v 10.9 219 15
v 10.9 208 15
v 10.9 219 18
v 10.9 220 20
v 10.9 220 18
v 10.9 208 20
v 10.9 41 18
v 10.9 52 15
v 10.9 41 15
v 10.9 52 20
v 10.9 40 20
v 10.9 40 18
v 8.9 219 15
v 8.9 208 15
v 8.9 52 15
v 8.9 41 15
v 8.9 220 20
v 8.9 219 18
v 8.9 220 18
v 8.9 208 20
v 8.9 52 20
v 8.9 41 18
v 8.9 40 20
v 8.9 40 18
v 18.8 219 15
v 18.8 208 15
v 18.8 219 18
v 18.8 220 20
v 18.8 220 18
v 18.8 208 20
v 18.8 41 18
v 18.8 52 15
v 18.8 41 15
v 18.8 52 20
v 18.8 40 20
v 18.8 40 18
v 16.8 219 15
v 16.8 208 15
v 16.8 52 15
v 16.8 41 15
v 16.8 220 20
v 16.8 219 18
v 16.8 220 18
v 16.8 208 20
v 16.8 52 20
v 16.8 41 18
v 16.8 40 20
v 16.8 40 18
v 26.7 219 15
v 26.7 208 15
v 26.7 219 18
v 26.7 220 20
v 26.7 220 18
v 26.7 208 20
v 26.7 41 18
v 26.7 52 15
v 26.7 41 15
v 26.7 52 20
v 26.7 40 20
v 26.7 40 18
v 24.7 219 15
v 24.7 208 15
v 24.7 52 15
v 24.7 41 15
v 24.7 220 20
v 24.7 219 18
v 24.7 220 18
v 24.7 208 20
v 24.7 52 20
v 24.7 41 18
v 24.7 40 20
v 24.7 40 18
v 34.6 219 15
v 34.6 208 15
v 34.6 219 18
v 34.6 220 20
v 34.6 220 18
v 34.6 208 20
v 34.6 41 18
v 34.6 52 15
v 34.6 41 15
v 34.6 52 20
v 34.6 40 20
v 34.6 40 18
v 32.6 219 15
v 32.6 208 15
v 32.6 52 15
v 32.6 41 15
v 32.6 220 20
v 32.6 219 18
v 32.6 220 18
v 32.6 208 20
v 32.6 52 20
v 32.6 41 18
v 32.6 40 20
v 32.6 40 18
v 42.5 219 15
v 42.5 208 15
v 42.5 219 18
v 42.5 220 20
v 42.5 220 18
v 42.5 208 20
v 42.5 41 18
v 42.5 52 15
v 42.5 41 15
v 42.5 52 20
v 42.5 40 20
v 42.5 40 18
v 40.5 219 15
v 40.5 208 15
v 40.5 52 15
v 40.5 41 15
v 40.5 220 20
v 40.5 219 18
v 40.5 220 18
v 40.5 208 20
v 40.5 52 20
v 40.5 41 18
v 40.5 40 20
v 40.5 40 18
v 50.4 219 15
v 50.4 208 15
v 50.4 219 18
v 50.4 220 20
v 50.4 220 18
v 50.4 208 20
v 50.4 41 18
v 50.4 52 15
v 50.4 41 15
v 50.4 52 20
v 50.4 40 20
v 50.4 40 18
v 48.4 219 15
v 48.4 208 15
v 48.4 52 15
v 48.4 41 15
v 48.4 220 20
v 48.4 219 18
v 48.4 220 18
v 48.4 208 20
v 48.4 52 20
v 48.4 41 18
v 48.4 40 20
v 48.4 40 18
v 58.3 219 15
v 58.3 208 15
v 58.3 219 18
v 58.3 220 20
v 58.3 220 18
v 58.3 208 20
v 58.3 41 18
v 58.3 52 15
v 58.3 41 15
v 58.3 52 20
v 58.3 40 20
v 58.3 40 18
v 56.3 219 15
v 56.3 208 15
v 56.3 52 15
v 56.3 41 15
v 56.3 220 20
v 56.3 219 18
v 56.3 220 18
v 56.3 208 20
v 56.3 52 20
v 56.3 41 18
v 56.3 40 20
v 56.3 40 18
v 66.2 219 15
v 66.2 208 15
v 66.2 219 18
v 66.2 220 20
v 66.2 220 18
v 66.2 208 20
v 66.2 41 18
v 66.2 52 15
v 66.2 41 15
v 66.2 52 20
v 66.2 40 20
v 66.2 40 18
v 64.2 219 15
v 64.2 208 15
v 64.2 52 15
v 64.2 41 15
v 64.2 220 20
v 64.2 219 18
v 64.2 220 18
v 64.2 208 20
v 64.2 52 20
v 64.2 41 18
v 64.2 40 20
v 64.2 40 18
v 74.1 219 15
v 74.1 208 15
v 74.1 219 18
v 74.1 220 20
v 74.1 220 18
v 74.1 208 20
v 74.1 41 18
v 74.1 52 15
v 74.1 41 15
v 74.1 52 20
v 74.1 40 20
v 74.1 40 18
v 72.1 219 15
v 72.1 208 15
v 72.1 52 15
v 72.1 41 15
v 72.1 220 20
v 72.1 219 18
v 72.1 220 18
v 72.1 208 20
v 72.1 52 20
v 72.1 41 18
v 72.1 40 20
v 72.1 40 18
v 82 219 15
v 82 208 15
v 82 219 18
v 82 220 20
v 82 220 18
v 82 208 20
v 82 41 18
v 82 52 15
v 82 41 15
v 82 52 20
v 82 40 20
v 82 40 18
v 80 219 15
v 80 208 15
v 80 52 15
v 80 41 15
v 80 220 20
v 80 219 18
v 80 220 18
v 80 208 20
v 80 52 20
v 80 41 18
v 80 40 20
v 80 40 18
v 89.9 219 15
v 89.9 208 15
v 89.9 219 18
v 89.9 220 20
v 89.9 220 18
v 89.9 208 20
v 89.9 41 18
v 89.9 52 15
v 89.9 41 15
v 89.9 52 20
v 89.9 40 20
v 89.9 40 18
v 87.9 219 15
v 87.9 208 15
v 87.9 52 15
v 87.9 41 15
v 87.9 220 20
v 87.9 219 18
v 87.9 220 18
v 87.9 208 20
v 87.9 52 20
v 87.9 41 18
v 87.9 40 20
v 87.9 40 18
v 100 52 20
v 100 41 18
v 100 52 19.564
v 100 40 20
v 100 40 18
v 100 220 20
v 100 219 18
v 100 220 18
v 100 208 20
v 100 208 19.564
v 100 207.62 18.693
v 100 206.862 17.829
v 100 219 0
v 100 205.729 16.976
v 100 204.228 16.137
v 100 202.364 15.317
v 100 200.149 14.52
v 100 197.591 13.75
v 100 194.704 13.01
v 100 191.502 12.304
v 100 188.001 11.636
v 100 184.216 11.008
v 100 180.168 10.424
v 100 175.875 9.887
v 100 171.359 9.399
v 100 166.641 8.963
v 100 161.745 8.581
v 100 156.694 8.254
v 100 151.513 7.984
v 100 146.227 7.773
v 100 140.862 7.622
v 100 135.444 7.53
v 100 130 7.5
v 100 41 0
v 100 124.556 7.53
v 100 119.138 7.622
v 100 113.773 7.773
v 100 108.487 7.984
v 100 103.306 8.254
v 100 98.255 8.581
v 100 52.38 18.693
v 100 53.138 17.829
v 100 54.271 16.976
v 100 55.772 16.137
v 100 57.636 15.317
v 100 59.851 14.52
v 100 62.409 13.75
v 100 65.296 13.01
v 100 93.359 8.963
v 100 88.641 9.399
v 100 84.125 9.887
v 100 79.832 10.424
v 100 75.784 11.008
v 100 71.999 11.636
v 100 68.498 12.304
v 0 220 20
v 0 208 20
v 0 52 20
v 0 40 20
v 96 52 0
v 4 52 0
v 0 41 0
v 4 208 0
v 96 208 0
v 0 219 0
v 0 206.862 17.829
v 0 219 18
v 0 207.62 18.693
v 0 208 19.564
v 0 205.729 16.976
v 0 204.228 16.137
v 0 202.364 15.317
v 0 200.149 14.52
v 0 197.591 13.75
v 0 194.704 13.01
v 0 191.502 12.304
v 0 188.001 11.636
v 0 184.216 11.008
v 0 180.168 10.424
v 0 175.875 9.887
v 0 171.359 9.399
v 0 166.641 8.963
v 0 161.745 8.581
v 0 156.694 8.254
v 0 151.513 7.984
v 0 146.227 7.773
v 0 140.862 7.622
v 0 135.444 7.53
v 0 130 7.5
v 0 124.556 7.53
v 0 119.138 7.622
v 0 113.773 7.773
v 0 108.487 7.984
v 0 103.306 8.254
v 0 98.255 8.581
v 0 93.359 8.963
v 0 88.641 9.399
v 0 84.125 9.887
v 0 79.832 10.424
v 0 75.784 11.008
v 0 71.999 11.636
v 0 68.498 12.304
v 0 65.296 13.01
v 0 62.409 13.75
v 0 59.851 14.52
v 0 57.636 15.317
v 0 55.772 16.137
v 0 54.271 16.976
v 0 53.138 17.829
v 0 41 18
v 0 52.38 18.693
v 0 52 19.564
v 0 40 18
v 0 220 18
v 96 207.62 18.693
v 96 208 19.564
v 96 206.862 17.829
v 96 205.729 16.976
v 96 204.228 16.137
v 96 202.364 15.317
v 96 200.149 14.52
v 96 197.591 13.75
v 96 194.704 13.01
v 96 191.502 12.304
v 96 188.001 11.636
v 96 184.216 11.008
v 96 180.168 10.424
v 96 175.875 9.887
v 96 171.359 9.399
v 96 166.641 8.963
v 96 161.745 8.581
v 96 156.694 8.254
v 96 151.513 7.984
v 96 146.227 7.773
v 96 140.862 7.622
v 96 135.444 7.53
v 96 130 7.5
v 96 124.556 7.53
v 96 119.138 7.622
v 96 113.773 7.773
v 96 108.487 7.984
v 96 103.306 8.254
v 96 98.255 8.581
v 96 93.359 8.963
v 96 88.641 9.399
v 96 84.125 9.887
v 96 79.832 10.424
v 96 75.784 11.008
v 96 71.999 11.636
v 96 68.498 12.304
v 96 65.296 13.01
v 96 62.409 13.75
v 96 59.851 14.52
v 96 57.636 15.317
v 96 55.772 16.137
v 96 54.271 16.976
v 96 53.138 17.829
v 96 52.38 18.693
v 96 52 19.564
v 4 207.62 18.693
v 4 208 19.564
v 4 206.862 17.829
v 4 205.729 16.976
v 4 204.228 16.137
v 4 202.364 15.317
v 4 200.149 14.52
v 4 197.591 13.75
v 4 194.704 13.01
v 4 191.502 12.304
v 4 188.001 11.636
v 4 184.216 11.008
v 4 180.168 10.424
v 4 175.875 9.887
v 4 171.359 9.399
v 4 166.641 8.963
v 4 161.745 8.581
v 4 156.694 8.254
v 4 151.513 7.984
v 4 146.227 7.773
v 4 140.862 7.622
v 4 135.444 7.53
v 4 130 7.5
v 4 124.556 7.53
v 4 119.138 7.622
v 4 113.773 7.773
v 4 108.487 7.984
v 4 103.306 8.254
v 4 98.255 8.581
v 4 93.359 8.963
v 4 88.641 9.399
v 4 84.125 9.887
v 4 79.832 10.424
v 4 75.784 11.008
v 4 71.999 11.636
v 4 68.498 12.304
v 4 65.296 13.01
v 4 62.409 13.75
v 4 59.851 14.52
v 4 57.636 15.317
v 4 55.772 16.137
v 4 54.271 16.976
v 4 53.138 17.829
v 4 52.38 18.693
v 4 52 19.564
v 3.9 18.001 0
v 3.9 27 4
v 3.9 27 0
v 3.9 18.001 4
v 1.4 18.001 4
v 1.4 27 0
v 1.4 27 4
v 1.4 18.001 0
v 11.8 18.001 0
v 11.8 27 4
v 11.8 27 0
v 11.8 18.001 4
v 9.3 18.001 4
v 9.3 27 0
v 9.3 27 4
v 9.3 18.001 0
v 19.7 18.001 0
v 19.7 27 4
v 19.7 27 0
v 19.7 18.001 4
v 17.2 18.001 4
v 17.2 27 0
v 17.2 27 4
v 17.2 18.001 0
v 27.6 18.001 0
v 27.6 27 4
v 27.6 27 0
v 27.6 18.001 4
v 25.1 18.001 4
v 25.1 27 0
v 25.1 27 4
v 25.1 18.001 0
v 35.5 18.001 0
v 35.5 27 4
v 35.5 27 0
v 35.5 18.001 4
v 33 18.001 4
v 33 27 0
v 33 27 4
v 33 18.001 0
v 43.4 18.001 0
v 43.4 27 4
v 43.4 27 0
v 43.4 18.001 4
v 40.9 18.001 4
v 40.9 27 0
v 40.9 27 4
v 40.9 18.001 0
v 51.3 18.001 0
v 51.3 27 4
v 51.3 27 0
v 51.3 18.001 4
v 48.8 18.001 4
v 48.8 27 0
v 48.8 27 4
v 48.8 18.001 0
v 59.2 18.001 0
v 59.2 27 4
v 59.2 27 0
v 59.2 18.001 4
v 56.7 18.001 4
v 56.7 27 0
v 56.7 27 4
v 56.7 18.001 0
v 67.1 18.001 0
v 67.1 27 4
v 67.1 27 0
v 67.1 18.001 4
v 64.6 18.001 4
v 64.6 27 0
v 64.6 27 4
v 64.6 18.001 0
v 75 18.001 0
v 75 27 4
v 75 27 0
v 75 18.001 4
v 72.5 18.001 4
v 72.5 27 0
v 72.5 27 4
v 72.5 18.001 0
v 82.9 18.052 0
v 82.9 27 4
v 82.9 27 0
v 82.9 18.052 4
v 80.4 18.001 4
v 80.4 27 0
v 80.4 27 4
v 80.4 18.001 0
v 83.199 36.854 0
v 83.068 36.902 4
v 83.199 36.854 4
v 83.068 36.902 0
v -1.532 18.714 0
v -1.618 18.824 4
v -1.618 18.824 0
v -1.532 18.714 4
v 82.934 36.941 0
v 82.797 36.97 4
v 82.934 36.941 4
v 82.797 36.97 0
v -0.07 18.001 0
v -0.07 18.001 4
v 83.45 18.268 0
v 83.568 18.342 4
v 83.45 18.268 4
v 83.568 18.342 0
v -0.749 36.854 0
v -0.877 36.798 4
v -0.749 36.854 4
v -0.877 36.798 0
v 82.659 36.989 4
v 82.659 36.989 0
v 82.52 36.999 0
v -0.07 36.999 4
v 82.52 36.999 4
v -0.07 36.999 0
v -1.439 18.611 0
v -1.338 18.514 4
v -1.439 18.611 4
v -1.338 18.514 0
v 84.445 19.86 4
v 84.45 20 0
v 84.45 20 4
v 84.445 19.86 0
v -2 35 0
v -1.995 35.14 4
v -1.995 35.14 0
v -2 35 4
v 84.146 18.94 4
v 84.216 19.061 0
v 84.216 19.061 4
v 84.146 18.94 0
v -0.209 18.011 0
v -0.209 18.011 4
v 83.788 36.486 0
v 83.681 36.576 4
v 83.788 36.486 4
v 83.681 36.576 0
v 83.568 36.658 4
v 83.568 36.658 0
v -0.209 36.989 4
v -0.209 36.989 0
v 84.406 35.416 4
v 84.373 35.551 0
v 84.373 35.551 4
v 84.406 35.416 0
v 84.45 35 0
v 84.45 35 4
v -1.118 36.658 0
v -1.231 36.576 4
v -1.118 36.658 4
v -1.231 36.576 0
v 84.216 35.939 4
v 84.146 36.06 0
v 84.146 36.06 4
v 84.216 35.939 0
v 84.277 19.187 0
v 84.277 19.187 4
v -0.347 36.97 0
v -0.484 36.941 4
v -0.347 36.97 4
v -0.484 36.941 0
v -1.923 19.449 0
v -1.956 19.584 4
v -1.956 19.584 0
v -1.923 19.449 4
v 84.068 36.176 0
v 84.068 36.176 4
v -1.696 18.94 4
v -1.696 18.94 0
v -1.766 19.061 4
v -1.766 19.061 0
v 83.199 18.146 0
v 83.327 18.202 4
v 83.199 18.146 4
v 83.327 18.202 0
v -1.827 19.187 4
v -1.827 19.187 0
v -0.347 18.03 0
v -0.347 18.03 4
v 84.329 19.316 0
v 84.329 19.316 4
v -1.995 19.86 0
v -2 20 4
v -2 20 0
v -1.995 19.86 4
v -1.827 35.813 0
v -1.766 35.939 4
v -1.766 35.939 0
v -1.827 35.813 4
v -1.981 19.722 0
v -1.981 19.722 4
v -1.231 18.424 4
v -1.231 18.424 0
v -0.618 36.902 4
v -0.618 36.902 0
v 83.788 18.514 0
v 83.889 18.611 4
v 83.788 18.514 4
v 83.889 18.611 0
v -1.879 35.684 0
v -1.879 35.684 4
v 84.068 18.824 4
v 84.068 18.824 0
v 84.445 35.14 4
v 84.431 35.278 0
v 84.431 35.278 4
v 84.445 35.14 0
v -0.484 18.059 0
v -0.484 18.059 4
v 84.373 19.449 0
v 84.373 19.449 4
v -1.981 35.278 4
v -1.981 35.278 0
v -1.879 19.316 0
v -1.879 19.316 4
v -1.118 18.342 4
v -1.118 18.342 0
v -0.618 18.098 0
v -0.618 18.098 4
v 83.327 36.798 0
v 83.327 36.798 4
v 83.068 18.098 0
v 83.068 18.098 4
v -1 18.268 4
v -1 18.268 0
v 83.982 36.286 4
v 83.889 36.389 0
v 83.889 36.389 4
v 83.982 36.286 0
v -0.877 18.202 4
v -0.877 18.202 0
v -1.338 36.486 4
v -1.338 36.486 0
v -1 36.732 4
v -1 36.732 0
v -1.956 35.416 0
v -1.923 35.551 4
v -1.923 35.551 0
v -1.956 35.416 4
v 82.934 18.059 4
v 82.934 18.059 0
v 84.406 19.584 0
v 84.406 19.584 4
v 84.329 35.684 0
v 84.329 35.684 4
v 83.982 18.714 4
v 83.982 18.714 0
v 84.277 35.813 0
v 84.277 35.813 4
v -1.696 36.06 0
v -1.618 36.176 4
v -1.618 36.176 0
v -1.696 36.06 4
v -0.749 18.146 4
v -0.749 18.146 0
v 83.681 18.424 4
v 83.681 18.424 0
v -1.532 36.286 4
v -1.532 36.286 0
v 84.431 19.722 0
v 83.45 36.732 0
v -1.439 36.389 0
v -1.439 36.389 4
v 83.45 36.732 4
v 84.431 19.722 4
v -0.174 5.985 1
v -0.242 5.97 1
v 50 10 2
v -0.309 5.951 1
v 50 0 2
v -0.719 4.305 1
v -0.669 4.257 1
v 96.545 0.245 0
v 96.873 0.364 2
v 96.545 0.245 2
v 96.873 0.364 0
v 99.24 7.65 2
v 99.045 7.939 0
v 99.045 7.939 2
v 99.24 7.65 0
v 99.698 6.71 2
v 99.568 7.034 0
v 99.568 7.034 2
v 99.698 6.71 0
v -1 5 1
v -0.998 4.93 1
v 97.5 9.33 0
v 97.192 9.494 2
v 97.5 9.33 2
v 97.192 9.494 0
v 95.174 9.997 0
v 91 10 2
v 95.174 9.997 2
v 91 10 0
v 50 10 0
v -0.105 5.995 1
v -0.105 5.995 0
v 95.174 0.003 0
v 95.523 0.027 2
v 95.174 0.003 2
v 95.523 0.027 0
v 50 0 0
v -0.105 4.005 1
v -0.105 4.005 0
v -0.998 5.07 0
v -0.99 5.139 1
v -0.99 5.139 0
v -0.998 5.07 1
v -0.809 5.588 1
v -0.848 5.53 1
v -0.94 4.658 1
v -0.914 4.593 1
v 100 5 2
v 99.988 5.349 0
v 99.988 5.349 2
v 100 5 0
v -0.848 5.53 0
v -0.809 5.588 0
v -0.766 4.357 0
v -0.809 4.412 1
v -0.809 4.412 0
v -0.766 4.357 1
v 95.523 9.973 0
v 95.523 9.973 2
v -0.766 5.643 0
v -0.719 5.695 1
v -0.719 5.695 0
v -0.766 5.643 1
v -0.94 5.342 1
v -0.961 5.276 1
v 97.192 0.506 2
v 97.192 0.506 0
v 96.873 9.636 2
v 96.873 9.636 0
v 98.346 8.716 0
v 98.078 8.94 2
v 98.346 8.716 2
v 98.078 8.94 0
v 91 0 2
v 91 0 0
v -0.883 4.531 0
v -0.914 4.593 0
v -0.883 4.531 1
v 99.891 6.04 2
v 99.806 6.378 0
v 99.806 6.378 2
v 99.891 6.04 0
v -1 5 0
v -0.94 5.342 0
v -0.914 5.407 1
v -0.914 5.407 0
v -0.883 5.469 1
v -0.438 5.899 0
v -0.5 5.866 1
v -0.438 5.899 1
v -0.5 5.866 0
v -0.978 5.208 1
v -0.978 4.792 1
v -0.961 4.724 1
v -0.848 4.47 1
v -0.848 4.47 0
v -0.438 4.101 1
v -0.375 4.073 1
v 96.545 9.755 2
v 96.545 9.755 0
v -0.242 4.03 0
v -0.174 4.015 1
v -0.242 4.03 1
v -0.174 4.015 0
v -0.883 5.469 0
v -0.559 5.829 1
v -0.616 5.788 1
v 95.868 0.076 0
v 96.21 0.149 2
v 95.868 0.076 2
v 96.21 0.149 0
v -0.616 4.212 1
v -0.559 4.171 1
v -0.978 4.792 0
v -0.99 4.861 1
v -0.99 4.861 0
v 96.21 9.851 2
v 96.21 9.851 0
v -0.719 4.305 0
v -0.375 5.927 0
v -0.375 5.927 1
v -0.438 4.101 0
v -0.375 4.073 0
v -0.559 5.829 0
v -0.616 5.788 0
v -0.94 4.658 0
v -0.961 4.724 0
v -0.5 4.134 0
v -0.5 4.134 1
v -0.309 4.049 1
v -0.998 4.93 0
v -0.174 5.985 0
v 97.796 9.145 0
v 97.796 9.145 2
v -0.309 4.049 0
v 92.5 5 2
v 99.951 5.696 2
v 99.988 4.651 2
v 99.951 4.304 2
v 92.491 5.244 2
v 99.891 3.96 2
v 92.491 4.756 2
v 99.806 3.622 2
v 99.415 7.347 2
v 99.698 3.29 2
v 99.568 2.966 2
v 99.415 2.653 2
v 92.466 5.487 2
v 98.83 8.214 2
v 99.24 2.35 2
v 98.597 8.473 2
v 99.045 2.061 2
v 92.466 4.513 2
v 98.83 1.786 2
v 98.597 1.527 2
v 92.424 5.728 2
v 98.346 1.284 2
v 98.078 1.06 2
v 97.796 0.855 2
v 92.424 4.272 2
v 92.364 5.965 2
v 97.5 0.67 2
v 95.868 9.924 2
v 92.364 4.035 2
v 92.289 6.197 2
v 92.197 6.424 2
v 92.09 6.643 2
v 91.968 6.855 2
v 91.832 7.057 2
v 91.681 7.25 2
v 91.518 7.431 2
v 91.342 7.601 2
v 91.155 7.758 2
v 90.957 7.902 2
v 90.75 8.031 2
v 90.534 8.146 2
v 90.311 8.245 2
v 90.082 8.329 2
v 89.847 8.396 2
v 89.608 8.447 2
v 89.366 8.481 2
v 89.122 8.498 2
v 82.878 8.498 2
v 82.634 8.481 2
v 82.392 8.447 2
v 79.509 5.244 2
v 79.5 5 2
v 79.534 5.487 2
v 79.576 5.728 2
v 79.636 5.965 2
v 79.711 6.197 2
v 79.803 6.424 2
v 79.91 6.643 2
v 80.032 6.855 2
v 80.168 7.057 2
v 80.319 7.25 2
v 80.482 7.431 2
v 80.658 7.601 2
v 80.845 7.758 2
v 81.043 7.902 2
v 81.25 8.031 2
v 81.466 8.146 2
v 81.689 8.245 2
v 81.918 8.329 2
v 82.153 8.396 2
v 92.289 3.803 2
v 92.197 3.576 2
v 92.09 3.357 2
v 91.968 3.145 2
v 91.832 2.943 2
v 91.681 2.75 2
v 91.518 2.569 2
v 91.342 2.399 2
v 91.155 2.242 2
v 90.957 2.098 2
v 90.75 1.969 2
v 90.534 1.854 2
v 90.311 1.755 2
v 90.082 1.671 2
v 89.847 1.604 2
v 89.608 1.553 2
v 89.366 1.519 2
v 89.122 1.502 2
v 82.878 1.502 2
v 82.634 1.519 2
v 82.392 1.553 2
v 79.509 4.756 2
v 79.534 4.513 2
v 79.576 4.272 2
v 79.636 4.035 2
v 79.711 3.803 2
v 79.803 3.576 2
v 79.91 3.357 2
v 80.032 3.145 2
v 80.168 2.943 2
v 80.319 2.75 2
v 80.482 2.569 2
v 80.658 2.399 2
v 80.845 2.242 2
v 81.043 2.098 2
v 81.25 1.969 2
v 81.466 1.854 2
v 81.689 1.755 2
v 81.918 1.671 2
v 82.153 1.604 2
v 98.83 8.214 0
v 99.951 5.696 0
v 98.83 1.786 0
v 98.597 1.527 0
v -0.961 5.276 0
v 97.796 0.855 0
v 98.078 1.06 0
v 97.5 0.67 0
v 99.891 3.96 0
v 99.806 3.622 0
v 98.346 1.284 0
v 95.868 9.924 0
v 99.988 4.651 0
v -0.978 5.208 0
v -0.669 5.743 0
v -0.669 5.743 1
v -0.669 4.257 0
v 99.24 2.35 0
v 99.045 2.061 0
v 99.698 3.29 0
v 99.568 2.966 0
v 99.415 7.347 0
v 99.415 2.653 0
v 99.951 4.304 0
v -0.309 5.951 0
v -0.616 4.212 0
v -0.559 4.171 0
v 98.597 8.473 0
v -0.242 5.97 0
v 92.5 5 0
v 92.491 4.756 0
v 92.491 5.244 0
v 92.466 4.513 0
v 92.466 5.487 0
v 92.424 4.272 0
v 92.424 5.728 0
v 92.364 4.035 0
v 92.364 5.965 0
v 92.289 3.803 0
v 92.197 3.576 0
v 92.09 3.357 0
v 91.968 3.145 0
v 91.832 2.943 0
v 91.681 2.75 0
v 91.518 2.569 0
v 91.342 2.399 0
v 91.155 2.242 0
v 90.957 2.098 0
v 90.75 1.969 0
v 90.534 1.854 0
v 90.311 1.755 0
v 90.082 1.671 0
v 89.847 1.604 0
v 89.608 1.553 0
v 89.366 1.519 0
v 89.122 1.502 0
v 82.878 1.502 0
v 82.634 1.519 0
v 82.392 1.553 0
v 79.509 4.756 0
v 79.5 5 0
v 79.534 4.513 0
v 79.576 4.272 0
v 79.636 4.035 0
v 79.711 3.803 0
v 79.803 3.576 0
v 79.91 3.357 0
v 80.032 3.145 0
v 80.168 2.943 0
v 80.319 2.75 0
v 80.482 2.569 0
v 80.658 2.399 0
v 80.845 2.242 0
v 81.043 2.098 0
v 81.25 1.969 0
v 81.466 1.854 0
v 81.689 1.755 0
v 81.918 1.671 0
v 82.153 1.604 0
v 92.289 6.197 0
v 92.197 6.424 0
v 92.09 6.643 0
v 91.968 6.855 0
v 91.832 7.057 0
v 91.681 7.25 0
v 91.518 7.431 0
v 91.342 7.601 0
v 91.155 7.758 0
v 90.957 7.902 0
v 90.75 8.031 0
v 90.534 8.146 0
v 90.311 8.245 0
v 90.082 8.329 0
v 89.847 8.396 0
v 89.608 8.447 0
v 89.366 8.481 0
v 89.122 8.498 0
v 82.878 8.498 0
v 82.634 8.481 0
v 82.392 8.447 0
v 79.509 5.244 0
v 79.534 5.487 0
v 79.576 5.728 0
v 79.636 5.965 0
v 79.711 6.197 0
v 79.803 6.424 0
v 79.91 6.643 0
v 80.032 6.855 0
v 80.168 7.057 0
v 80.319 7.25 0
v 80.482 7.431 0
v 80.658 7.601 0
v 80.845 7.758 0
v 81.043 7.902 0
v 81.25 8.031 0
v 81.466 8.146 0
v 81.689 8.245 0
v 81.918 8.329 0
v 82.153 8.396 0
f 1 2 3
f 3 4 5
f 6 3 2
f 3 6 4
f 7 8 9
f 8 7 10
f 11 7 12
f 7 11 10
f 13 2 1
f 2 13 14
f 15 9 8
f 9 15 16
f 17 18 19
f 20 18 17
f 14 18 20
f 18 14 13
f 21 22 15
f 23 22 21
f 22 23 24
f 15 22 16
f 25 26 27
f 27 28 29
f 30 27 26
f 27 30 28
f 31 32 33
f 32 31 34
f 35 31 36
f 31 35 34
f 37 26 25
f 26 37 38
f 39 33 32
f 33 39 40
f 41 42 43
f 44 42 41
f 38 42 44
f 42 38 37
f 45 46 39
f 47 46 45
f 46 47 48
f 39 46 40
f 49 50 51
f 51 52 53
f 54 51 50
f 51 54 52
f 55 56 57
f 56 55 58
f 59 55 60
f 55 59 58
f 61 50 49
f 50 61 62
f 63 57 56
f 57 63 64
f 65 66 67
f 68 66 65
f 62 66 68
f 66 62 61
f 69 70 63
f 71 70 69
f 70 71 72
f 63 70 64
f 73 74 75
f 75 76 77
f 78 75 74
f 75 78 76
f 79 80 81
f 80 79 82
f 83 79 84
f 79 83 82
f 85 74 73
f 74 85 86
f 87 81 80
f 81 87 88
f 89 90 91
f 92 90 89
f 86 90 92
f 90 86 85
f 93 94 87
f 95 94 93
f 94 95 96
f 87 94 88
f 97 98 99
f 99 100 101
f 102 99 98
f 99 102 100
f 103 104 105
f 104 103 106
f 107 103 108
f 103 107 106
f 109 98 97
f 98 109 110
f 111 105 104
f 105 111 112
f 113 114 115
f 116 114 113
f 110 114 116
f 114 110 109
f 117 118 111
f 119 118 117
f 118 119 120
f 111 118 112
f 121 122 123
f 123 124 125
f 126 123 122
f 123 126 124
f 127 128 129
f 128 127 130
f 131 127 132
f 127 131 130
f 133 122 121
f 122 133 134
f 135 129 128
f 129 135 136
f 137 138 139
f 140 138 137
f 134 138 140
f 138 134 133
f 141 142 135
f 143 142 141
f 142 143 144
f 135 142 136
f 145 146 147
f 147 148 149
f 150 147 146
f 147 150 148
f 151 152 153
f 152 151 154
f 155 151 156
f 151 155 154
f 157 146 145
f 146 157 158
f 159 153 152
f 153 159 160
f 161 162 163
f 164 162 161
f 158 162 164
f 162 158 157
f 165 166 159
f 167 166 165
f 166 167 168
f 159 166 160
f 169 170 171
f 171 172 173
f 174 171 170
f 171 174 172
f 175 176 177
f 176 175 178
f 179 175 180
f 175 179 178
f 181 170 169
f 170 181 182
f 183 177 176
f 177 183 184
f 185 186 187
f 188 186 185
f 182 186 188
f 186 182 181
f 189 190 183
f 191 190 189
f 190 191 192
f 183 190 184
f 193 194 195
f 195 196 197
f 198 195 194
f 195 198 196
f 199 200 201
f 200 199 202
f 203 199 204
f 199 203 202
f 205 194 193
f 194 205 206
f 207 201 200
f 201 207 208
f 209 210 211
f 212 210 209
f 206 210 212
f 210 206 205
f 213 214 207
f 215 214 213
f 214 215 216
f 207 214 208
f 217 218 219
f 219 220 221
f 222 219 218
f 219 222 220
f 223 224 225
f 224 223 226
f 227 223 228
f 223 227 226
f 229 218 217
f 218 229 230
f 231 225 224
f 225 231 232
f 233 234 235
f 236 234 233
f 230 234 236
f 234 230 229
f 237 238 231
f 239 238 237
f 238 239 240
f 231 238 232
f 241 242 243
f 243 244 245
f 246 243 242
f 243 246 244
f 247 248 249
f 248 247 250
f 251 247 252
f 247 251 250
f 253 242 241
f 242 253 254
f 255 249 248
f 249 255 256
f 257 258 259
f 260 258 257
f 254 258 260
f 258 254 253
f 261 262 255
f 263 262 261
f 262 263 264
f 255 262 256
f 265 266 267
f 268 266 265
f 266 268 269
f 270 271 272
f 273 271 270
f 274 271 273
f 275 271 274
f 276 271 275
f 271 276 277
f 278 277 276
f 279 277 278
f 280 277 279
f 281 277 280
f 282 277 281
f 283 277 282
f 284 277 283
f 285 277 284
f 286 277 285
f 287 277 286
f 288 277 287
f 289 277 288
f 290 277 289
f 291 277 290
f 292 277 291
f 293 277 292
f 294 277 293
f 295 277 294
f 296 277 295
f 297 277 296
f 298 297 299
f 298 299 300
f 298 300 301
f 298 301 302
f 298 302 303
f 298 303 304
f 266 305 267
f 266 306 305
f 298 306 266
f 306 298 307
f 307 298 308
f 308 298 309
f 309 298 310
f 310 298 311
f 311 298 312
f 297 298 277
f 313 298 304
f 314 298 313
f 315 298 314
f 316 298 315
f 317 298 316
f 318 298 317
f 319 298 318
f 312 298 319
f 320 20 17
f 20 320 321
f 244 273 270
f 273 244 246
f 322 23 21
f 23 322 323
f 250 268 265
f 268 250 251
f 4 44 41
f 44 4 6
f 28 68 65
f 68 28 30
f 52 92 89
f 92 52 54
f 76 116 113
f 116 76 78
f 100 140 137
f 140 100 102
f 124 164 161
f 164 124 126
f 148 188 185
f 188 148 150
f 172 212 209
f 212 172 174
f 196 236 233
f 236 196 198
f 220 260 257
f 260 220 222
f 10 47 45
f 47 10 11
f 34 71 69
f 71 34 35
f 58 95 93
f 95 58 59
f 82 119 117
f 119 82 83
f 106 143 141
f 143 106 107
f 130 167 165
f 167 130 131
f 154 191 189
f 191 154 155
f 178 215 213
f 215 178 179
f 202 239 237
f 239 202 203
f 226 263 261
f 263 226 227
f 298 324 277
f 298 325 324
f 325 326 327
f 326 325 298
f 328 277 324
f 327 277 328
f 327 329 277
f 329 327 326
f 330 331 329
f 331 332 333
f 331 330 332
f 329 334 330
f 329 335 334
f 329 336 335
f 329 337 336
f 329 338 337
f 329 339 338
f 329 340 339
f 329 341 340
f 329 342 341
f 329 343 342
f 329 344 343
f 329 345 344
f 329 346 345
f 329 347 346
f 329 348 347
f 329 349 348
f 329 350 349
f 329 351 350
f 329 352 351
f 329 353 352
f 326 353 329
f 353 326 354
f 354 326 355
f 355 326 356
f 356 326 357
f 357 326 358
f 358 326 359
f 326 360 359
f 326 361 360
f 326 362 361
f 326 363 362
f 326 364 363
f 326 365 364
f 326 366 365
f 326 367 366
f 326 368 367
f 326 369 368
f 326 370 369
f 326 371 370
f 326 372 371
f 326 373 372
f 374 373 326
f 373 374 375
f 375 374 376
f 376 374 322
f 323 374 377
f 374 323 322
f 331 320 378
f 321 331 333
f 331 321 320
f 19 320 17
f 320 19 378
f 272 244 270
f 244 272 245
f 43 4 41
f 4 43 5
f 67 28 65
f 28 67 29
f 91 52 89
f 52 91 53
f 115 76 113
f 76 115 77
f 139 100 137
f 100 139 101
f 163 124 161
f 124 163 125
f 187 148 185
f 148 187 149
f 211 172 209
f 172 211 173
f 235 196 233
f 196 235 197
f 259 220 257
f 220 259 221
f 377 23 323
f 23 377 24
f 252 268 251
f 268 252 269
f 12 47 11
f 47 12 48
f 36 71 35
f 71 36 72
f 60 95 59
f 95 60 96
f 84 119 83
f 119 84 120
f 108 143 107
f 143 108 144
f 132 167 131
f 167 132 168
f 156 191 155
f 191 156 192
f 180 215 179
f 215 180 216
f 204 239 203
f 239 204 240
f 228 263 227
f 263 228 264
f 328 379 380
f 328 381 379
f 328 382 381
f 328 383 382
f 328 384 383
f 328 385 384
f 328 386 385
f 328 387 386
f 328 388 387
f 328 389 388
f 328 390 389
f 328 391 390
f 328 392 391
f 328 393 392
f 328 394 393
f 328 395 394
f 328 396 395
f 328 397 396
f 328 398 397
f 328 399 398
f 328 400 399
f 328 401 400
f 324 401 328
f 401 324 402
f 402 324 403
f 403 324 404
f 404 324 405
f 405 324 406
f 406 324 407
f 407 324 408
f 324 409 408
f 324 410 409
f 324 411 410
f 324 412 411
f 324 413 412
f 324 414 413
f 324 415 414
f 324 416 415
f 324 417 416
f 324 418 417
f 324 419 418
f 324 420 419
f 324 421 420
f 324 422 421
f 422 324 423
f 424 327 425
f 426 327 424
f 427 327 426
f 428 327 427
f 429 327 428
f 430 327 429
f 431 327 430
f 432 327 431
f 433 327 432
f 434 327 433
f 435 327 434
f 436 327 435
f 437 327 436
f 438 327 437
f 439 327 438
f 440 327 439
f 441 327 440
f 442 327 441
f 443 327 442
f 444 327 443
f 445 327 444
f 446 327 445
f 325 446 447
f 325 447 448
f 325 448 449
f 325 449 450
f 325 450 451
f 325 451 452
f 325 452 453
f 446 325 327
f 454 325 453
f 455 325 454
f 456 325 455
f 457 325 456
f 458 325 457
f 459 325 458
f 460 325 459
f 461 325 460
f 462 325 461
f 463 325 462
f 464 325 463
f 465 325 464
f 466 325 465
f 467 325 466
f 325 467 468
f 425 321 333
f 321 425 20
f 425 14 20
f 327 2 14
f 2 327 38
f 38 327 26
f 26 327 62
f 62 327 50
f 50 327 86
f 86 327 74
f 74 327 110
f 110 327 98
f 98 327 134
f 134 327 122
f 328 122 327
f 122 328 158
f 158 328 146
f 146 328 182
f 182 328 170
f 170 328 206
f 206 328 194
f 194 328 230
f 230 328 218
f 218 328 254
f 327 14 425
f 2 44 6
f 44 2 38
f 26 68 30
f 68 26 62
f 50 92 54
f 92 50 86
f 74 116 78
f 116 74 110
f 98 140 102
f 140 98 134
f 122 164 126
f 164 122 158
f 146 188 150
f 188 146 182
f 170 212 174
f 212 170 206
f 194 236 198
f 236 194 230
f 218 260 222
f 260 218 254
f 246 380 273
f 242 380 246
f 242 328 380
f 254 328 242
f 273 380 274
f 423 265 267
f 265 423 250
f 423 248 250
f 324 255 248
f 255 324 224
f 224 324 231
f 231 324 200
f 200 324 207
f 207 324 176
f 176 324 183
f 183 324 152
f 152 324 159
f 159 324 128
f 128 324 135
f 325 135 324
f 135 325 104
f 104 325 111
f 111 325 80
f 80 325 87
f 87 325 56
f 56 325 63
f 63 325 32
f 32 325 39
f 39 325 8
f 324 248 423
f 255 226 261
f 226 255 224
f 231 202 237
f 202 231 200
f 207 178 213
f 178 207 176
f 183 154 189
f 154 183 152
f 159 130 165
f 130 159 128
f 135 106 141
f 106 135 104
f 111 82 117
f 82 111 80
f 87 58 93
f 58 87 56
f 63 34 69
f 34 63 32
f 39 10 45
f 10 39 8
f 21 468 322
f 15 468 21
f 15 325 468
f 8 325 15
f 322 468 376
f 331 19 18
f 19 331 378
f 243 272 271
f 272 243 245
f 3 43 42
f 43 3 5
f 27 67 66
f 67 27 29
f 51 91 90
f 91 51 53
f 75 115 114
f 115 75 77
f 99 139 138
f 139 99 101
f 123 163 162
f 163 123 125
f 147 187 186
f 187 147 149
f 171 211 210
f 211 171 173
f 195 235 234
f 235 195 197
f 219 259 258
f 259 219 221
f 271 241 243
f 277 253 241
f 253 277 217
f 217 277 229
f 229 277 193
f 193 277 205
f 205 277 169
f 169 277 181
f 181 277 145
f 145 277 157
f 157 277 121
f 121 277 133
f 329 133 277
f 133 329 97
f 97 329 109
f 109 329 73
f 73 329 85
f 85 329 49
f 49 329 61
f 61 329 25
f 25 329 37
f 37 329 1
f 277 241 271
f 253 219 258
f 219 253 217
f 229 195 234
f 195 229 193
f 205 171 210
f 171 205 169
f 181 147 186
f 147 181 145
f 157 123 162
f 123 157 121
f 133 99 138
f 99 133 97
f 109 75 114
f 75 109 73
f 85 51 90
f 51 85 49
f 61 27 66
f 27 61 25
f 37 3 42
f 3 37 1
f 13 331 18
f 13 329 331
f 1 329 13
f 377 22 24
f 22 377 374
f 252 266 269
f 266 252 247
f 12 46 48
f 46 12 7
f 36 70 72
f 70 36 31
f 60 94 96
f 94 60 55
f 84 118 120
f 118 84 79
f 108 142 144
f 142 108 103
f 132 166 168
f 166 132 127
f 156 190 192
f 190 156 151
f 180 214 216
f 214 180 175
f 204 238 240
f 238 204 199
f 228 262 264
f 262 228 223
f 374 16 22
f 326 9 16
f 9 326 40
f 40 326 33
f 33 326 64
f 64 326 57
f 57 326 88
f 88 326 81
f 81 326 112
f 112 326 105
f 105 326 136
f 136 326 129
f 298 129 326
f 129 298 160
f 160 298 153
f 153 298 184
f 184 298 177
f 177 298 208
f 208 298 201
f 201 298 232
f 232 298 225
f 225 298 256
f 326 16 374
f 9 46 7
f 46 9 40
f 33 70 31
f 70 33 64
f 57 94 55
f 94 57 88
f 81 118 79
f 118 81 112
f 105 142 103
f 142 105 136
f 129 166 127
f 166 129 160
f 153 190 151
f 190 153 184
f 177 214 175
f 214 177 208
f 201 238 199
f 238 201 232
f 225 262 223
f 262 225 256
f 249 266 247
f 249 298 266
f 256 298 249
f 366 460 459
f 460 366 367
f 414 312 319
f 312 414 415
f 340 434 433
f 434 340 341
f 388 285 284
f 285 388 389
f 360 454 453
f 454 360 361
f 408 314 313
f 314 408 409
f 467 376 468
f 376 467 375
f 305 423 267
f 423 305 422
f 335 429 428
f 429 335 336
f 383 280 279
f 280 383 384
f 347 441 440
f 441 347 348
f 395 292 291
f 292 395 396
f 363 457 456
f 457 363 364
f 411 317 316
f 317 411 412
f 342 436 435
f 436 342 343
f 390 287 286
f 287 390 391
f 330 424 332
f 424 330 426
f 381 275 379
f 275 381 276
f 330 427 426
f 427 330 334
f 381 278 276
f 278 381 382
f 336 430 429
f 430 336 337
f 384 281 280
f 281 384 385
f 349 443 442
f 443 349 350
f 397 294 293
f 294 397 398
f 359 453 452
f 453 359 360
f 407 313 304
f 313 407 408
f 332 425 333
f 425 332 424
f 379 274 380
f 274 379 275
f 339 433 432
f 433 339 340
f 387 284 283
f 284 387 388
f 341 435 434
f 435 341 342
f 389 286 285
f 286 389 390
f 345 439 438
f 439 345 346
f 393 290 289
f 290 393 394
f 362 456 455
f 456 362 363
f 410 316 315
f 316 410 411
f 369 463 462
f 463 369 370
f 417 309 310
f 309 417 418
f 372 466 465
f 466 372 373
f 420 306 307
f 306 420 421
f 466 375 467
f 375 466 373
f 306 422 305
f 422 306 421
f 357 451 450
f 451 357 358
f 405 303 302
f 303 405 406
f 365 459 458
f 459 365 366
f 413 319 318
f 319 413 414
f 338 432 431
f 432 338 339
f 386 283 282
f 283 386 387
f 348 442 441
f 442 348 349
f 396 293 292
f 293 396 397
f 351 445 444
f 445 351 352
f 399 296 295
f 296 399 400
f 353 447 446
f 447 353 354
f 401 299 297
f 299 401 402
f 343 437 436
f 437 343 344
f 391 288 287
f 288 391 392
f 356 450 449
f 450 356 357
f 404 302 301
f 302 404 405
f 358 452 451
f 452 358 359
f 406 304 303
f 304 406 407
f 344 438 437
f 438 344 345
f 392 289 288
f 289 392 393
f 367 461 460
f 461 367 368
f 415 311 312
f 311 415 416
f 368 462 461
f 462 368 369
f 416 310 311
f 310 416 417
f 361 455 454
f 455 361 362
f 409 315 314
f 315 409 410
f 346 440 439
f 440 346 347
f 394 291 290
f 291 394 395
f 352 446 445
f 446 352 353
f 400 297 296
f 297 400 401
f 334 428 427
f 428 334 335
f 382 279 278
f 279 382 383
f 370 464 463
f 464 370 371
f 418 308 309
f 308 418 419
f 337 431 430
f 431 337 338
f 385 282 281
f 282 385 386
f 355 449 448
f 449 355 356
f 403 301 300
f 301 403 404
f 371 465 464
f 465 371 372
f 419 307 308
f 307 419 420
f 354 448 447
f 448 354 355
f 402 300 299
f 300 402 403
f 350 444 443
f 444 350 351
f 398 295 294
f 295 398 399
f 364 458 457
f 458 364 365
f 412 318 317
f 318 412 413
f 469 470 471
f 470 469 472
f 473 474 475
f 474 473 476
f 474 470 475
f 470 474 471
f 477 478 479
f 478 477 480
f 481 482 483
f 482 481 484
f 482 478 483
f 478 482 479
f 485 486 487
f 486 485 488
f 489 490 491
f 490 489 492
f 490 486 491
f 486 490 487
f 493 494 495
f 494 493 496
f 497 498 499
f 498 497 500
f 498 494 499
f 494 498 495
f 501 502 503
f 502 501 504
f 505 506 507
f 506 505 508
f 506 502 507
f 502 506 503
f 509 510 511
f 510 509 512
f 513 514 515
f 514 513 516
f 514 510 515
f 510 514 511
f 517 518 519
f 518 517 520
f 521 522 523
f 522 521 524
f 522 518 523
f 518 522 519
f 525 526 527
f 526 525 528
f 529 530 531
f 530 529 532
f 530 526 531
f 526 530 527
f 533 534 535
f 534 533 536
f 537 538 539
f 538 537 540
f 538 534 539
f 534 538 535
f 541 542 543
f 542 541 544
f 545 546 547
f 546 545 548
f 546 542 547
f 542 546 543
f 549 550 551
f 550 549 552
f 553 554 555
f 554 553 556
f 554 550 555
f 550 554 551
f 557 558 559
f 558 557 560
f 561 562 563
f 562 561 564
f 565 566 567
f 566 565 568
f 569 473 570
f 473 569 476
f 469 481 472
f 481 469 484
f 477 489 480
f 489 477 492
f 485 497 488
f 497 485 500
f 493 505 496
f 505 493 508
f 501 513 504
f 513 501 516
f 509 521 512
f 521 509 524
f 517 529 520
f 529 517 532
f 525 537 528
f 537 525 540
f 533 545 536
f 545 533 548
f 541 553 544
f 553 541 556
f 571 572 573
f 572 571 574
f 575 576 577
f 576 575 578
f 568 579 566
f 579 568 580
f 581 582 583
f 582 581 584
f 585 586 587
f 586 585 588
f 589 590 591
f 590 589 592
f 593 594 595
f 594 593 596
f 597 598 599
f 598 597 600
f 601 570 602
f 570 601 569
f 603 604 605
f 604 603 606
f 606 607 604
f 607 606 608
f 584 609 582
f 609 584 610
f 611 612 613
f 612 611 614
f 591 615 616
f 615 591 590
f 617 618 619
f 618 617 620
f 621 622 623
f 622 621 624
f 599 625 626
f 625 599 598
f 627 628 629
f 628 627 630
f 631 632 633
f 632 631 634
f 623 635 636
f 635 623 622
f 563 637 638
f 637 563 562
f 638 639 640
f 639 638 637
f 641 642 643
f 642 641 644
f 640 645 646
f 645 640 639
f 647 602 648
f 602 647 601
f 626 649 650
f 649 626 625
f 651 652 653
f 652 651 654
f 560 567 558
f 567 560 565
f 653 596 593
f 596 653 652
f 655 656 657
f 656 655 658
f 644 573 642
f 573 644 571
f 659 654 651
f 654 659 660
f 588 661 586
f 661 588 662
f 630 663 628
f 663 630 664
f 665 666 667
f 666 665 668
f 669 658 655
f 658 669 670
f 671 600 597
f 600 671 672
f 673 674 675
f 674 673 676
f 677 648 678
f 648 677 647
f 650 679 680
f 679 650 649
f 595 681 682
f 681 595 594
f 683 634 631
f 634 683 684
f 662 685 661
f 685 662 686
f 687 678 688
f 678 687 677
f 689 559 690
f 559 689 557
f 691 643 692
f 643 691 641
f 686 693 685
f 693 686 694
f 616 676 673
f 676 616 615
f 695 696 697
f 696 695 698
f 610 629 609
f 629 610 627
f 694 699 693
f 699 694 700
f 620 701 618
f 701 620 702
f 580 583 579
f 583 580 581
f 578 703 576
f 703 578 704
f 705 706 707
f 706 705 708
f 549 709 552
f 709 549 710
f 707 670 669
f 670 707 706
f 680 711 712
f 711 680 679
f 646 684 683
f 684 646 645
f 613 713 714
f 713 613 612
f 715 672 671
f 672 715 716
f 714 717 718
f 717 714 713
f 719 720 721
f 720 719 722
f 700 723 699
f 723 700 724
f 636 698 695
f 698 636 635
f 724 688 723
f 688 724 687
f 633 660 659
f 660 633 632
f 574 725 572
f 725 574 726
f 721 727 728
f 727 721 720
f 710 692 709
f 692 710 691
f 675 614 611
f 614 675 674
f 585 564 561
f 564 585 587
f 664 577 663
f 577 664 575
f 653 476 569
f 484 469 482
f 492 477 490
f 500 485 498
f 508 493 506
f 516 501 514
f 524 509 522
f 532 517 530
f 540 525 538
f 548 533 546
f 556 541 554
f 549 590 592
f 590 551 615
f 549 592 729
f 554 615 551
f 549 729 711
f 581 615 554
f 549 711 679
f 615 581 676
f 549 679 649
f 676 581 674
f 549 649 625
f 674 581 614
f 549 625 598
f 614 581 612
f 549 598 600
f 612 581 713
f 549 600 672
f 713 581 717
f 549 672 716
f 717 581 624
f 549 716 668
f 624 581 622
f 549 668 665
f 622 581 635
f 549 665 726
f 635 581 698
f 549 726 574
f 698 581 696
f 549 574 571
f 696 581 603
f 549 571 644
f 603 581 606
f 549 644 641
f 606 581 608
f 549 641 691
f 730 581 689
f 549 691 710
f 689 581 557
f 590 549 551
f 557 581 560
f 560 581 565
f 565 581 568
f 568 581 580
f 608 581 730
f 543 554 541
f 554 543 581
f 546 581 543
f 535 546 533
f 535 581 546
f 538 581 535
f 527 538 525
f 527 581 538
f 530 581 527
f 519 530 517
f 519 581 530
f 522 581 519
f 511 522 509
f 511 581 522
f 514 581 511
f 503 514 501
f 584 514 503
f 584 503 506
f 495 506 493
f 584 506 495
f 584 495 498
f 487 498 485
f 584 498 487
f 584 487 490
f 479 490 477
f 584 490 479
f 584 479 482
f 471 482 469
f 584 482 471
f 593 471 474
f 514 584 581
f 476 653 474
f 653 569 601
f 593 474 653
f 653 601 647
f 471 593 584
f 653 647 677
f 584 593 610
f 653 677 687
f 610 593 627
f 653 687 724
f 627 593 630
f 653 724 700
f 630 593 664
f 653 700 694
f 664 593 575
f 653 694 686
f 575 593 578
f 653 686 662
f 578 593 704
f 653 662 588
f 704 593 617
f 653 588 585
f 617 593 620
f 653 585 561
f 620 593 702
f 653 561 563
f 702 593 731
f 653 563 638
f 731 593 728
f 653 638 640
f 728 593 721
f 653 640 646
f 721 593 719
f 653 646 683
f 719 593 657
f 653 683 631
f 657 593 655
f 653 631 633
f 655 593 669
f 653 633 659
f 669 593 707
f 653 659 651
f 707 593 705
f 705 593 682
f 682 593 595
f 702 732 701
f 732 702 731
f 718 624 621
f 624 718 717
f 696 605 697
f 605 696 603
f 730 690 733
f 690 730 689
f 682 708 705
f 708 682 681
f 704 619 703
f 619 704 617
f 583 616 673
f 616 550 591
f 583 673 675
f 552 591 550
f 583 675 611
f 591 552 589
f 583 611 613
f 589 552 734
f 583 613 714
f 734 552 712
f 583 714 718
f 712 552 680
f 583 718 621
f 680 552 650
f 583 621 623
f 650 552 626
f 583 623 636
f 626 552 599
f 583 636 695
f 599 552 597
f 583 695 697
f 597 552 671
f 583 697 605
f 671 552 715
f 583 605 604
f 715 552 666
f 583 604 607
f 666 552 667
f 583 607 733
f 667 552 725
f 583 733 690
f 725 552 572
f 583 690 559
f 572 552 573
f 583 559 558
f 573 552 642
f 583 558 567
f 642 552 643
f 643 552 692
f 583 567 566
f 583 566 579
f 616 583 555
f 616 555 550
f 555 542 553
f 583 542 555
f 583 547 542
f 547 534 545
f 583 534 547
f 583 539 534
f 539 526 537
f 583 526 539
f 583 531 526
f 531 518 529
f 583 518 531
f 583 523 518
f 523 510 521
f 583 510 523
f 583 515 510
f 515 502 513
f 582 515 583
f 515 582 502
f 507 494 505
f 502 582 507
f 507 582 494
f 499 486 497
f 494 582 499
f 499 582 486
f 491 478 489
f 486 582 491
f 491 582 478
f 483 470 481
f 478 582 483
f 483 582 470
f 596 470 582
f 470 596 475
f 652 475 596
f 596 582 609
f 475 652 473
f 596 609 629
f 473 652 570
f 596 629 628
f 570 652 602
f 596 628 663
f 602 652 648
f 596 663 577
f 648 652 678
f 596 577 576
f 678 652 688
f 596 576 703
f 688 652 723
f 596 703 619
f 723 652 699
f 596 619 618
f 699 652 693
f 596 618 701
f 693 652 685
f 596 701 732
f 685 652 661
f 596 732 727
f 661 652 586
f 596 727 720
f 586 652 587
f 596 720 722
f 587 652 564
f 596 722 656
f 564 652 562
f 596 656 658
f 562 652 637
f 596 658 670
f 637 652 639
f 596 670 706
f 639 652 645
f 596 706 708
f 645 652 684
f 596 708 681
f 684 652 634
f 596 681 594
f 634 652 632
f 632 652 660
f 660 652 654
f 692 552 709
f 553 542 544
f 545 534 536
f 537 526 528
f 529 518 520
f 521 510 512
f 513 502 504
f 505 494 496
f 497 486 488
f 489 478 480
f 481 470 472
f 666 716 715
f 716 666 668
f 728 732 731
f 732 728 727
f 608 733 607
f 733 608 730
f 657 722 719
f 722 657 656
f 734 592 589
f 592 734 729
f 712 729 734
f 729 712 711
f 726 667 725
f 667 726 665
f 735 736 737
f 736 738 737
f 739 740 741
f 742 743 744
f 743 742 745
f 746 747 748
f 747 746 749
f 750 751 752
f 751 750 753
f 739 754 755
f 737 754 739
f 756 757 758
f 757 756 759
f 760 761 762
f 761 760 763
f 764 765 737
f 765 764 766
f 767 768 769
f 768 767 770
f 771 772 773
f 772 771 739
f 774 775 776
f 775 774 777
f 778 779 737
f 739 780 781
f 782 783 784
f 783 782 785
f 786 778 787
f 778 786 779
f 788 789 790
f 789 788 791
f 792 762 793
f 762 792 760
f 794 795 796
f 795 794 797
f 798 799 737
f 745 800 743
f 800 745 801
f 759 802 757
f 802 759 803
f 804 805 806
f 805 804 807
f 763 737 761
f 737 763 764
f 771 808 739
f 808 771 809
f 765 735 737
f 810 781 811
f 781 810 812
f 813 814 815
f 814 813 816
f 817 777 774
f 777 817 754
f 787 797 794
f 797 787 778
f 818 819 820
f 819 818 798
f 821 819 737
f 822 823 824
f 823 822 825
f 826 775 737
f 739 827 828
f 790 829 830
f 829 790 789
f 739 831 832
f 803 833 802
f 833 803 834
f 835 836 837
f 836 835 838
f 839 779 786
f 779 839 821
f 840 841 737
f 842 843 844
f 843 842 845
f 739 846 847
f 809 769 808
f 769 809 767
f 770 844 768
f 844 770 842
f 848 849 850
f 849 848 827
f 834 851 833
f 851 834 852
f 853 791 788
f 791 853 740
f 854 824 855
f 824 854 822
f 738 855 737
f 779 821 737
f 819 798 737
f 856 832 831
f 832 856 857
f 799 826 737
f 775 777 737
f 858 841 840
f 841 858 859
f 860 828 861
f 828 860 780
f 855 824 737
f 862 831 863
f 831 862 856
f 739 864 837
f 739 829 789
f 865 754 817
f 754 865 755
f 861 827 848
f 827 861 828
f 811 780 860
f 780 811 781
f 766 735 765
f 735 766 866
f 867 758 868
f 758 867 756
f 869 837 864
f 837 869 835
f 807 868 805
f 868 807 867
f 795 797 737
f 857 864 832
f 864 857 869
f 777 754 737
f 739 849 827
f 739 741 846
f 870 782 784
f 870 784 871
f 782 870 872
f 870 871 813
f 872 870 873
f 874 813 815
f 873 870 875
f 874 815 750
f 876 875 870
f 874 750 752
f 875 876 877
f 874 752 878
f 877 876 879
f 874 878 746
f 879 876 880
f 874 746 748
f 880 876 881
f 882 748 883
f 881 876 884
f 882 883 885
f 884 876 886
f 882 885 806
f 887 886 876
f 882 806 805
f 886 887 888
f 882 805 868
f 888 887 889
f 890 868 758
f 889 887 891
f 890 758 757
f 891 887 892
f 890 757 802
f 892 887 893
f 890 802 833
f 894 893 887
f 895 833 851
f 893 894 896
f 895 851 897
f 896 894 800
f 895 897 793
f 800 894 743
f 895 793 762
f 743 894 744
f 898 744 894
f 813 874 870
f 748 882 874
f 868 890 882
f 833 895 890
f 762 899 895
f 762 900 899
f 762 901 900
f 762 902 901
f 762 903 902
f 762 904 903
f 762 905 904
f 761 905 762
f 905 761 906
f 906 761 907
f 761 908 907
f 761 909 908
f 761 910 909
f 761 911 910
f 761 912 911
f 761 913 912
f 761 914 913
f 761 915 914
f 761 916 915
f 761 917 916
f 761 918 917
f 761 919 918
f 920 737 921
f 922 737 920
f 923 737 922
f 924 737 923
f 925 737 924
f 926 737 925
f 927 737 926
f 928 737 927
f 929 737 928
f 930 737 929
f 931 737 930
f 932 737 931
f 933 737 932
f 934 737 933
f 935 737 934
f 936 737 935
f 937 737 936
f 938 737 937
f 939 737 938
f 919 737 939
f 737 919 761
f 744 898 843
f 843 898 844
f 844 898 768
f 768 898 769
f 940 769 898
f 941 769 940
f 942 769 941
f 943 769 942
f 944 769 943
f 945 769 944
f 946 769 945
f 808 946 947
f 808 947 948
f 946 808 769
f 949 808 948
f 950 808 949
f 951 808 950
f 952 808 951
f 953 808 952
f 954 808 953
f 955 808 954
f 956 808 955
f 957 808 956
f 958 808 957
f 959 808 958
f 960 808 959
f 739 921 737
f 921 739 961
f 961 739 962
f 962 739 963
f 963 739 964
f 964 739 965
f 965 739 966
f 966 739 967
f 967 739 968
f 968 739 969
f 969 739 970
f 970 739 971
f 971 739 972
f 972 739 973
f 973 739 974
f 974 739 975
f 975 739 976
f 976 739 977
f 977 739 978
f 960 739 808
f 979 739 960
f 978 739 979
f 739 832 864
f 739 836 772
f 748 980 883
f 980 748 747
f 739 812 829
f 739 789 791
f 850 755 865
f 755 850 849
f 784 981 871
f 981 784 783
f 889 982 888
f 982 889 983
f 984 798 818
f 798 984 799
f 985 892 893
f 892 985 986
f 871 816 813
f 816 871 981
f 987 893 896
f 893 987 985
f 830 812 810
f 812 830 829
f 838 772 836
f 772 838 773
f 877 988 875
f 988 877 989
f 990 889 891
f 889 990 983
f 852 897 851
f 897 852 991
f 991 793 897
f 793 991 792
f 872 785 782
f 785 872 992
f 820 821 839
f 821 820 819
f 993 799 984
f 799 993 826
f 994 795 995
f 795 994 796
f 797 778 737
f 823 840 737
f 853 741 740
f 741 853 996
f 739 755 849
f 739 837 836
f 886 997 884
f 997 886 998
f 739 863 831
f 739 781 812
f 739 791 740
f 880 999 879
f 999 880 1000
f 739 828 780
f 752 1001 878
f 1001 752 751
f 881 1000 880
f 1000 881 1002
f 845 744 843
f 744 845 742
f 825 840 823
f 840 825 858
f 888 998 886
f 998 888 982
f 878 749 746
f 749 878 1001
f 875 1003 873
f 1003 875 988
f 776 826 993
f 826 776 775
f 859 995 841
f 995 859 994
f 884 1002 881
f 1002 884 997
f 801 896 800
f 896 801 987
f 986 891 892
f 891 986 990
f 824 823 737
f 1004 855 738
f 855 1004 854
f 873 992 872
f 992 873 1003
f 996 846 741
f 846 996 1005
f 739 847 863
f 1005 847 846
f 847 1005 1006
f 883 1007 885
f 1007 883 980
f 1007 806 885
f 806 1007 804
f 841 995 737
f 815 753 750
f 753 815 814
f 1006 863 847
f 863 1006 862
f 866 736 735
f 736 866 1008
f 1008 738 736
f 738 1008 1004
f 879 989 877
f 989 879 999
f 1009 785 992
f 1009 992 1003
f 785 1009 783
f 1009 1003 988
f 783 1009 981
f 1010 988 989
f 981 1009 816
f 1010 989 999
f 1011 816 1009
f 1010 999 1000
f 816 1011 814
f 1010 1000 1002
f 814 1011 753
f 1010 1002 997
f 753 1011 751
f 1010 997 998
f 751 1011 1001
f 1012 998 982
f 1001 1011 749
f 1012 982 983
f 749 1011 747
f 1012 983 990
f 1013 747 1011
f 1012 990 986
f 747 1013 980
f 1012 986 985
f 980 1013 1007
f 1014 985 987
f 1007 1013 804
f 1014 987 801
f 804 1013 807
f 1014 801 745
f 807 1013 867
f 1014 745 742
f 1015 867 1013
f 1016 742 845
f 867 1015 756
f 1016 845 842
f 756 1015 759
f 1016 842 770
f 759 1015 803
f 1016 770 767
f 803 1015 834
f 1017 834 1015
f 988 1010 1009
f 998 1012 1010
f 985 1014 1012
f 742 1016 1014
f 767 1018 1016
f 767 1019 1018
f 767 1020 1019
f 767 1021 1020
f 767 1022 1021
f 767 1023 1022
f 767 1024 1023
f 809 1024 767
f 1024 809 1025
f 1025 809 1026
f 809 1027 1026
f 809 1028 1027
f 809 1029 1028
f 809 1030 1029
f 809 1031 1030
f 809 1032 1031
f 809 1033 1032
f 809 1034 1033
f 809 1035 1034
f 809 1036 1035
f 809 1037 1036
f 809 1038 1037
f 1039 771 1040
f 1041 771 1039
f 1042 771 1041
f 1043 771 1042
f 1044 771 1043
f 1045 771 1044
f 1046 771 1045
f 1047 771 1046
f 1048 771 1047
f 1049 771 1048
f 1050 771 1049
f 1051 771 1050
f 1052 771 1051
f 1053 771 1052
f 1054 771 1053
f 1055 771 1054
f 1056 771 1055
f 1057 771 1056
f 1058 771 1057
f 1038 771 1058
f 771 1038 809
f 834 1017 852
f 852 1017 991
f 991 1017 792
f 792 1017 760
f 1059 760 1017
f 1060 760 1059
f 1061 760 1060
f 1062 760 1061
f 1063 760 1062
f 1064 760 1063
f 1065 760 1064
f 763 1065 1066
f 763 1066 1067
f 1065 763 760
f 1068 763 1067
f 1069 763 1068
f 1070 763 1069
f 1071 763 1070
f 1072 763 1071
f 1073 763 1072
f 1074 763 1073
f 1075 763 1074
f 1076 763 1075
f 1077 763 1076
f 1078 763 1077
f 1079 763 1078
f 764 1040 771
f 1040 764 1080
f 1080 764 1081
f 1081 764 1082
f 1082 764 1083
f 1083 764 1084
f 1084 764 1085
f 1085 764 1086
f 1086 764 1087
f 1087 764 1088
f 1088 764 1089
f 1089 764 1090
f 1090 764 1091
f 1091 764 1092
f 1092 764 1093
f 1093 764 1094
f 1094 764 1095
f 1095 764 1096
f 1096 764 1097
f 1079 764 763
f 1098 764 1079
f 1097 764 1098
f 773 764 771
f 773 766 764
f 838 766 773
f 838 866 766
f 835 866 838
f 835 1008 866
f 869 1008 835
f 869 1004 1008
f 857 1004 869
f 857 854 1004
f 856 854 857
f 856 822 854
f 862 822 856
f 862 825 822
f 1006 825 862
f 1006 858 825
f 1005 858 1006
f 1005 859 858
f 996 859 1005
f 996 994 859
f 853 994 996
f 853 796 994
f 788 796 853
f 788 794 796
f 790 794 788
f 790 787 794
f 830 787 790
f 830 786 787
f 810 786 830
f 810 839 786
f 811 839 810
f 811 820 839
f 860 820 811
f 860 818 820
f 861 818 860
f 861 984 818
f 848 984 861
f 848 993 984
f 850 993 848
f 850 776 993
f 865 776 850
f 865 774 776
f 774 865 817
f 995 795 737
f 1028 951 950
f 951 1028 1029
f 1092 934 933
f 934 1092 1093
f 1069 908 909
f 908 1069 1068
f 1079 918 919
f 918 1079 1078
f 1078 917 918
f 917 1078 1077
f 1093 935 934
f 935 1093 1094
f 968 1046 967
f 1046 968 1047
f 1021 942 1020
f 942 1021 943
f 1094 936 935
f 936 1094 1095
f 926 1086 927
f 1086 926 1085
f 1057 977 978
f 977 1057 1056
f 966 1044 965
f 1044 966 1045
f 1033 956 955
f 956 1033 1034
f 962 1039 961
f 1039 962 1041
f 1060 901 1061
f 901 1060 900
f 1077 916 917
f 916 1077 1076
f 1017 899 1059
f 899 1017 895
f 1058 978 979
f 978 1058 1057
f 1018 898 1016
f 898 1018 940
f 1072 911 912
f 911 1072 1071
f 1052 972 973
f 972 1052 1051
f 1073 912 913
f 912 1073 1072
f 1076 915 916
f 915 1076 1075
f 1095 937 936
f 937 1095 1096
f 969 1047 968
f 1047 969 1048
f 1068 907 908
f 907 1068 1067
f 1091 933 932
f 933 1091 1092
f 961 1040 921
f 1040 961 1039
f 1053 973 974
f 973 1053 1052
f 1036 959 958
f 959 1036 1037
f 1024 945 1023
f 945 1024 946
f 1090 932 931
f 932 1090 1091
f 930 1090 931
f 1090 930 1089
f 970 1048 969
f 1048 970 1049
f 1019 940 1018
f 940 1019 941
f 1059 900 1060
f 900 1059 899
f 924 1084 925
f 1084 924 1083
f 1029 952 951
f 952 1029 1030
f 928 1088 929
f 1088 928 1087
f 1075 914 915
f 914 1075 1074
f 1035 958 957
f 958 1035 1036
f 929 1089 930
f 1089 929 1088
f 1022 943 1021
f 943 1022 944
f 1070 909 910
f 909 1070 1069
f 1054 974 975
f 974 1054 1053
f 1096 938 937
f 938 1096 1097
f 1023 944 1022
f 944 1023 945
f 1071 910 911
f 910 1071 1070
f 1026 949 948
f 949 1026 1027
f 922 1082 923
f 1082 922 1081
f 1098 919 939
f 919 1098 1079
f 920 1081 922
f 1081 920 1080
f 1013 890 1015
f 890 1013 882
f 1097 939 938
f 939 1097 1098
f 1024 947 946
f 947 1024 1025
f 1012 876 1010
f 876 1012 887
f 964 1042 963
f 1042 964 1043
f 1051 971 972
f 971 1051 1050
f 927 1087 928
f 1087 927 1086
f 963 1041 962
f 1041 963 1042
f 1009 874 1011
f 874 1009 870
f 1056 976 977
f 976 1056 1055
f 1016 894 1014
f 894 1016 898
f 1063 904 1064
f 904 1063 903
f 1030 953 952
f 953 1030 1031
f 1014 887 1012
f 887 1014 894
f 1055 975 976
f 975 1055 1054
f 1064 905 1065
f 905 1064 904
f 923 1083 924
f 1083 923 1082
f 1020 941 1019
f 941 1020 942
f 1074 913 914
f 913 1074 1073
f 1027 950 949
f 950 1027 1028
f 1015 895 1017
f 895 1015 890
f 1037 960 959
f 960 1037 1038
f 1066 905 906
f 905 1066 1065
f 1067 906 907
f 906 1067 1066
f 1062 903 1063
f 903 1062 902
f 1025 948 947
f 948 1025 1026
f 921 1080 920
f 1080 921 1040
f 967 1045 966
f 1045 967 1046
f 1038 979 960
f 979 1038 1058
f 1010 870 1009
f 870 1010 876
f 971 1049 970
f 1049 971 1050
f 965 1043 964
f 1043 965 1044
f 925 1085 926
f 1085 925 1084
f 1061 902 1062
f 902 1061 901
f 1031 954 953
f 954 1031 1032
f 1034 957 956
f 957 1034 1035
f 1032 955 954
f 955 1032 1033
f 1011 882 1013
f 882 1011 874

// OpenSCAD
//Author M. Dietz http://www.dietzm.de
//to render with F5, edit openscad preferences to allow more than 2000 objects

// Modified Jan 2019 by Richard Bateman to make customizeable

// Height of the loom
height=20;

// Width of the loom (default 100)
width=100;

// Length of the loom (default 180)
length=180;

// Thickness of the supports in mm (default 4mm)
supportThickness=4;

// The number of supports besides the end pieces to add
supports=0;

// Width of the sides (default 12)
sideWidth=12;

// What to show/render
show="all"; // [all:All parts, loom:Just the loom, kamm:Just the kamm, nadel:Just the nadel]


// [Hidden]

yarnInset=15;
yarnCount=(width-yarnInset) / 7.9 + 0.5;



$fn=90;

if (show == "all") {
    translate([0,40,0]) loom();
    translate([0,20,0]) kamm();
    nadel();
}
else if (show == "loom") {
    loom();
}
else if (show == "kamm") {
    kamm();
}
else if (show == "nadel") {
    nadel();
}

module loom(){
    difference() {
        union() {
            difference(){
                cube([width, length, height]);
                translate([supportThickness,sideWidth,-0.1]) cube([width - supportThickness*2, length-sideWidth*2, height]);

                for (i = [1:yarnCount]){
                    #translate([i*7.9+1,-1,height-5]) cube([2,length+3,5.5]);
                }
                translate([0,length-1,0]) cube([width,5,height-2]);
                translate([0,-4,0]) cube([width,5,height-2]);
            }
            if (supports > 0) {
                for (i = [1:supports]) {
                    pieceSize = width / (supports+1);
                    curPiece = pieceSize * i - supportThickness/2;
                    //echo("Current piece:", curPiece);
                    translate([curPiece, 5, 0]) cube([supportThickness, length-10, supportThickness]);
                }
            }
        }
        translate([-1,length/2, height]) rotate([0,90,0])
            linear_extrude(height=width+2) resize([height*1.25, length-sideWidth*2]) circle(d=length-sideWidth*2);
   }
}

kammWidth = yarnCount*7.9 - 6.5;

module kamm(){
    difference(){
        minkowski() {
            cube([kammWidth, 15, 3]);
            cylinder(r=2,h=1);
        }
        for (i = [1:yarnCount]) {
            #translate([i*7.9-6.5,-3,-0.1]) cube([2.5,10,5]);
        }
    }
}

module nadel(){
    difference() {
        hull() {
            translate([0,5,0])  cylinder(r=1,h=1);
            translate([50,0,0]) cube([41,10,2]);
            translate([95,5,0])  cylinder(r=5,h=2);
        }
        hull(){
            translate([89,5,-0.1])  cylinder(r=3.5,h=2.5);
            translate([83,5,-0.1])  cylinder(r=3.5,h=2.5);
        }
    }
}
